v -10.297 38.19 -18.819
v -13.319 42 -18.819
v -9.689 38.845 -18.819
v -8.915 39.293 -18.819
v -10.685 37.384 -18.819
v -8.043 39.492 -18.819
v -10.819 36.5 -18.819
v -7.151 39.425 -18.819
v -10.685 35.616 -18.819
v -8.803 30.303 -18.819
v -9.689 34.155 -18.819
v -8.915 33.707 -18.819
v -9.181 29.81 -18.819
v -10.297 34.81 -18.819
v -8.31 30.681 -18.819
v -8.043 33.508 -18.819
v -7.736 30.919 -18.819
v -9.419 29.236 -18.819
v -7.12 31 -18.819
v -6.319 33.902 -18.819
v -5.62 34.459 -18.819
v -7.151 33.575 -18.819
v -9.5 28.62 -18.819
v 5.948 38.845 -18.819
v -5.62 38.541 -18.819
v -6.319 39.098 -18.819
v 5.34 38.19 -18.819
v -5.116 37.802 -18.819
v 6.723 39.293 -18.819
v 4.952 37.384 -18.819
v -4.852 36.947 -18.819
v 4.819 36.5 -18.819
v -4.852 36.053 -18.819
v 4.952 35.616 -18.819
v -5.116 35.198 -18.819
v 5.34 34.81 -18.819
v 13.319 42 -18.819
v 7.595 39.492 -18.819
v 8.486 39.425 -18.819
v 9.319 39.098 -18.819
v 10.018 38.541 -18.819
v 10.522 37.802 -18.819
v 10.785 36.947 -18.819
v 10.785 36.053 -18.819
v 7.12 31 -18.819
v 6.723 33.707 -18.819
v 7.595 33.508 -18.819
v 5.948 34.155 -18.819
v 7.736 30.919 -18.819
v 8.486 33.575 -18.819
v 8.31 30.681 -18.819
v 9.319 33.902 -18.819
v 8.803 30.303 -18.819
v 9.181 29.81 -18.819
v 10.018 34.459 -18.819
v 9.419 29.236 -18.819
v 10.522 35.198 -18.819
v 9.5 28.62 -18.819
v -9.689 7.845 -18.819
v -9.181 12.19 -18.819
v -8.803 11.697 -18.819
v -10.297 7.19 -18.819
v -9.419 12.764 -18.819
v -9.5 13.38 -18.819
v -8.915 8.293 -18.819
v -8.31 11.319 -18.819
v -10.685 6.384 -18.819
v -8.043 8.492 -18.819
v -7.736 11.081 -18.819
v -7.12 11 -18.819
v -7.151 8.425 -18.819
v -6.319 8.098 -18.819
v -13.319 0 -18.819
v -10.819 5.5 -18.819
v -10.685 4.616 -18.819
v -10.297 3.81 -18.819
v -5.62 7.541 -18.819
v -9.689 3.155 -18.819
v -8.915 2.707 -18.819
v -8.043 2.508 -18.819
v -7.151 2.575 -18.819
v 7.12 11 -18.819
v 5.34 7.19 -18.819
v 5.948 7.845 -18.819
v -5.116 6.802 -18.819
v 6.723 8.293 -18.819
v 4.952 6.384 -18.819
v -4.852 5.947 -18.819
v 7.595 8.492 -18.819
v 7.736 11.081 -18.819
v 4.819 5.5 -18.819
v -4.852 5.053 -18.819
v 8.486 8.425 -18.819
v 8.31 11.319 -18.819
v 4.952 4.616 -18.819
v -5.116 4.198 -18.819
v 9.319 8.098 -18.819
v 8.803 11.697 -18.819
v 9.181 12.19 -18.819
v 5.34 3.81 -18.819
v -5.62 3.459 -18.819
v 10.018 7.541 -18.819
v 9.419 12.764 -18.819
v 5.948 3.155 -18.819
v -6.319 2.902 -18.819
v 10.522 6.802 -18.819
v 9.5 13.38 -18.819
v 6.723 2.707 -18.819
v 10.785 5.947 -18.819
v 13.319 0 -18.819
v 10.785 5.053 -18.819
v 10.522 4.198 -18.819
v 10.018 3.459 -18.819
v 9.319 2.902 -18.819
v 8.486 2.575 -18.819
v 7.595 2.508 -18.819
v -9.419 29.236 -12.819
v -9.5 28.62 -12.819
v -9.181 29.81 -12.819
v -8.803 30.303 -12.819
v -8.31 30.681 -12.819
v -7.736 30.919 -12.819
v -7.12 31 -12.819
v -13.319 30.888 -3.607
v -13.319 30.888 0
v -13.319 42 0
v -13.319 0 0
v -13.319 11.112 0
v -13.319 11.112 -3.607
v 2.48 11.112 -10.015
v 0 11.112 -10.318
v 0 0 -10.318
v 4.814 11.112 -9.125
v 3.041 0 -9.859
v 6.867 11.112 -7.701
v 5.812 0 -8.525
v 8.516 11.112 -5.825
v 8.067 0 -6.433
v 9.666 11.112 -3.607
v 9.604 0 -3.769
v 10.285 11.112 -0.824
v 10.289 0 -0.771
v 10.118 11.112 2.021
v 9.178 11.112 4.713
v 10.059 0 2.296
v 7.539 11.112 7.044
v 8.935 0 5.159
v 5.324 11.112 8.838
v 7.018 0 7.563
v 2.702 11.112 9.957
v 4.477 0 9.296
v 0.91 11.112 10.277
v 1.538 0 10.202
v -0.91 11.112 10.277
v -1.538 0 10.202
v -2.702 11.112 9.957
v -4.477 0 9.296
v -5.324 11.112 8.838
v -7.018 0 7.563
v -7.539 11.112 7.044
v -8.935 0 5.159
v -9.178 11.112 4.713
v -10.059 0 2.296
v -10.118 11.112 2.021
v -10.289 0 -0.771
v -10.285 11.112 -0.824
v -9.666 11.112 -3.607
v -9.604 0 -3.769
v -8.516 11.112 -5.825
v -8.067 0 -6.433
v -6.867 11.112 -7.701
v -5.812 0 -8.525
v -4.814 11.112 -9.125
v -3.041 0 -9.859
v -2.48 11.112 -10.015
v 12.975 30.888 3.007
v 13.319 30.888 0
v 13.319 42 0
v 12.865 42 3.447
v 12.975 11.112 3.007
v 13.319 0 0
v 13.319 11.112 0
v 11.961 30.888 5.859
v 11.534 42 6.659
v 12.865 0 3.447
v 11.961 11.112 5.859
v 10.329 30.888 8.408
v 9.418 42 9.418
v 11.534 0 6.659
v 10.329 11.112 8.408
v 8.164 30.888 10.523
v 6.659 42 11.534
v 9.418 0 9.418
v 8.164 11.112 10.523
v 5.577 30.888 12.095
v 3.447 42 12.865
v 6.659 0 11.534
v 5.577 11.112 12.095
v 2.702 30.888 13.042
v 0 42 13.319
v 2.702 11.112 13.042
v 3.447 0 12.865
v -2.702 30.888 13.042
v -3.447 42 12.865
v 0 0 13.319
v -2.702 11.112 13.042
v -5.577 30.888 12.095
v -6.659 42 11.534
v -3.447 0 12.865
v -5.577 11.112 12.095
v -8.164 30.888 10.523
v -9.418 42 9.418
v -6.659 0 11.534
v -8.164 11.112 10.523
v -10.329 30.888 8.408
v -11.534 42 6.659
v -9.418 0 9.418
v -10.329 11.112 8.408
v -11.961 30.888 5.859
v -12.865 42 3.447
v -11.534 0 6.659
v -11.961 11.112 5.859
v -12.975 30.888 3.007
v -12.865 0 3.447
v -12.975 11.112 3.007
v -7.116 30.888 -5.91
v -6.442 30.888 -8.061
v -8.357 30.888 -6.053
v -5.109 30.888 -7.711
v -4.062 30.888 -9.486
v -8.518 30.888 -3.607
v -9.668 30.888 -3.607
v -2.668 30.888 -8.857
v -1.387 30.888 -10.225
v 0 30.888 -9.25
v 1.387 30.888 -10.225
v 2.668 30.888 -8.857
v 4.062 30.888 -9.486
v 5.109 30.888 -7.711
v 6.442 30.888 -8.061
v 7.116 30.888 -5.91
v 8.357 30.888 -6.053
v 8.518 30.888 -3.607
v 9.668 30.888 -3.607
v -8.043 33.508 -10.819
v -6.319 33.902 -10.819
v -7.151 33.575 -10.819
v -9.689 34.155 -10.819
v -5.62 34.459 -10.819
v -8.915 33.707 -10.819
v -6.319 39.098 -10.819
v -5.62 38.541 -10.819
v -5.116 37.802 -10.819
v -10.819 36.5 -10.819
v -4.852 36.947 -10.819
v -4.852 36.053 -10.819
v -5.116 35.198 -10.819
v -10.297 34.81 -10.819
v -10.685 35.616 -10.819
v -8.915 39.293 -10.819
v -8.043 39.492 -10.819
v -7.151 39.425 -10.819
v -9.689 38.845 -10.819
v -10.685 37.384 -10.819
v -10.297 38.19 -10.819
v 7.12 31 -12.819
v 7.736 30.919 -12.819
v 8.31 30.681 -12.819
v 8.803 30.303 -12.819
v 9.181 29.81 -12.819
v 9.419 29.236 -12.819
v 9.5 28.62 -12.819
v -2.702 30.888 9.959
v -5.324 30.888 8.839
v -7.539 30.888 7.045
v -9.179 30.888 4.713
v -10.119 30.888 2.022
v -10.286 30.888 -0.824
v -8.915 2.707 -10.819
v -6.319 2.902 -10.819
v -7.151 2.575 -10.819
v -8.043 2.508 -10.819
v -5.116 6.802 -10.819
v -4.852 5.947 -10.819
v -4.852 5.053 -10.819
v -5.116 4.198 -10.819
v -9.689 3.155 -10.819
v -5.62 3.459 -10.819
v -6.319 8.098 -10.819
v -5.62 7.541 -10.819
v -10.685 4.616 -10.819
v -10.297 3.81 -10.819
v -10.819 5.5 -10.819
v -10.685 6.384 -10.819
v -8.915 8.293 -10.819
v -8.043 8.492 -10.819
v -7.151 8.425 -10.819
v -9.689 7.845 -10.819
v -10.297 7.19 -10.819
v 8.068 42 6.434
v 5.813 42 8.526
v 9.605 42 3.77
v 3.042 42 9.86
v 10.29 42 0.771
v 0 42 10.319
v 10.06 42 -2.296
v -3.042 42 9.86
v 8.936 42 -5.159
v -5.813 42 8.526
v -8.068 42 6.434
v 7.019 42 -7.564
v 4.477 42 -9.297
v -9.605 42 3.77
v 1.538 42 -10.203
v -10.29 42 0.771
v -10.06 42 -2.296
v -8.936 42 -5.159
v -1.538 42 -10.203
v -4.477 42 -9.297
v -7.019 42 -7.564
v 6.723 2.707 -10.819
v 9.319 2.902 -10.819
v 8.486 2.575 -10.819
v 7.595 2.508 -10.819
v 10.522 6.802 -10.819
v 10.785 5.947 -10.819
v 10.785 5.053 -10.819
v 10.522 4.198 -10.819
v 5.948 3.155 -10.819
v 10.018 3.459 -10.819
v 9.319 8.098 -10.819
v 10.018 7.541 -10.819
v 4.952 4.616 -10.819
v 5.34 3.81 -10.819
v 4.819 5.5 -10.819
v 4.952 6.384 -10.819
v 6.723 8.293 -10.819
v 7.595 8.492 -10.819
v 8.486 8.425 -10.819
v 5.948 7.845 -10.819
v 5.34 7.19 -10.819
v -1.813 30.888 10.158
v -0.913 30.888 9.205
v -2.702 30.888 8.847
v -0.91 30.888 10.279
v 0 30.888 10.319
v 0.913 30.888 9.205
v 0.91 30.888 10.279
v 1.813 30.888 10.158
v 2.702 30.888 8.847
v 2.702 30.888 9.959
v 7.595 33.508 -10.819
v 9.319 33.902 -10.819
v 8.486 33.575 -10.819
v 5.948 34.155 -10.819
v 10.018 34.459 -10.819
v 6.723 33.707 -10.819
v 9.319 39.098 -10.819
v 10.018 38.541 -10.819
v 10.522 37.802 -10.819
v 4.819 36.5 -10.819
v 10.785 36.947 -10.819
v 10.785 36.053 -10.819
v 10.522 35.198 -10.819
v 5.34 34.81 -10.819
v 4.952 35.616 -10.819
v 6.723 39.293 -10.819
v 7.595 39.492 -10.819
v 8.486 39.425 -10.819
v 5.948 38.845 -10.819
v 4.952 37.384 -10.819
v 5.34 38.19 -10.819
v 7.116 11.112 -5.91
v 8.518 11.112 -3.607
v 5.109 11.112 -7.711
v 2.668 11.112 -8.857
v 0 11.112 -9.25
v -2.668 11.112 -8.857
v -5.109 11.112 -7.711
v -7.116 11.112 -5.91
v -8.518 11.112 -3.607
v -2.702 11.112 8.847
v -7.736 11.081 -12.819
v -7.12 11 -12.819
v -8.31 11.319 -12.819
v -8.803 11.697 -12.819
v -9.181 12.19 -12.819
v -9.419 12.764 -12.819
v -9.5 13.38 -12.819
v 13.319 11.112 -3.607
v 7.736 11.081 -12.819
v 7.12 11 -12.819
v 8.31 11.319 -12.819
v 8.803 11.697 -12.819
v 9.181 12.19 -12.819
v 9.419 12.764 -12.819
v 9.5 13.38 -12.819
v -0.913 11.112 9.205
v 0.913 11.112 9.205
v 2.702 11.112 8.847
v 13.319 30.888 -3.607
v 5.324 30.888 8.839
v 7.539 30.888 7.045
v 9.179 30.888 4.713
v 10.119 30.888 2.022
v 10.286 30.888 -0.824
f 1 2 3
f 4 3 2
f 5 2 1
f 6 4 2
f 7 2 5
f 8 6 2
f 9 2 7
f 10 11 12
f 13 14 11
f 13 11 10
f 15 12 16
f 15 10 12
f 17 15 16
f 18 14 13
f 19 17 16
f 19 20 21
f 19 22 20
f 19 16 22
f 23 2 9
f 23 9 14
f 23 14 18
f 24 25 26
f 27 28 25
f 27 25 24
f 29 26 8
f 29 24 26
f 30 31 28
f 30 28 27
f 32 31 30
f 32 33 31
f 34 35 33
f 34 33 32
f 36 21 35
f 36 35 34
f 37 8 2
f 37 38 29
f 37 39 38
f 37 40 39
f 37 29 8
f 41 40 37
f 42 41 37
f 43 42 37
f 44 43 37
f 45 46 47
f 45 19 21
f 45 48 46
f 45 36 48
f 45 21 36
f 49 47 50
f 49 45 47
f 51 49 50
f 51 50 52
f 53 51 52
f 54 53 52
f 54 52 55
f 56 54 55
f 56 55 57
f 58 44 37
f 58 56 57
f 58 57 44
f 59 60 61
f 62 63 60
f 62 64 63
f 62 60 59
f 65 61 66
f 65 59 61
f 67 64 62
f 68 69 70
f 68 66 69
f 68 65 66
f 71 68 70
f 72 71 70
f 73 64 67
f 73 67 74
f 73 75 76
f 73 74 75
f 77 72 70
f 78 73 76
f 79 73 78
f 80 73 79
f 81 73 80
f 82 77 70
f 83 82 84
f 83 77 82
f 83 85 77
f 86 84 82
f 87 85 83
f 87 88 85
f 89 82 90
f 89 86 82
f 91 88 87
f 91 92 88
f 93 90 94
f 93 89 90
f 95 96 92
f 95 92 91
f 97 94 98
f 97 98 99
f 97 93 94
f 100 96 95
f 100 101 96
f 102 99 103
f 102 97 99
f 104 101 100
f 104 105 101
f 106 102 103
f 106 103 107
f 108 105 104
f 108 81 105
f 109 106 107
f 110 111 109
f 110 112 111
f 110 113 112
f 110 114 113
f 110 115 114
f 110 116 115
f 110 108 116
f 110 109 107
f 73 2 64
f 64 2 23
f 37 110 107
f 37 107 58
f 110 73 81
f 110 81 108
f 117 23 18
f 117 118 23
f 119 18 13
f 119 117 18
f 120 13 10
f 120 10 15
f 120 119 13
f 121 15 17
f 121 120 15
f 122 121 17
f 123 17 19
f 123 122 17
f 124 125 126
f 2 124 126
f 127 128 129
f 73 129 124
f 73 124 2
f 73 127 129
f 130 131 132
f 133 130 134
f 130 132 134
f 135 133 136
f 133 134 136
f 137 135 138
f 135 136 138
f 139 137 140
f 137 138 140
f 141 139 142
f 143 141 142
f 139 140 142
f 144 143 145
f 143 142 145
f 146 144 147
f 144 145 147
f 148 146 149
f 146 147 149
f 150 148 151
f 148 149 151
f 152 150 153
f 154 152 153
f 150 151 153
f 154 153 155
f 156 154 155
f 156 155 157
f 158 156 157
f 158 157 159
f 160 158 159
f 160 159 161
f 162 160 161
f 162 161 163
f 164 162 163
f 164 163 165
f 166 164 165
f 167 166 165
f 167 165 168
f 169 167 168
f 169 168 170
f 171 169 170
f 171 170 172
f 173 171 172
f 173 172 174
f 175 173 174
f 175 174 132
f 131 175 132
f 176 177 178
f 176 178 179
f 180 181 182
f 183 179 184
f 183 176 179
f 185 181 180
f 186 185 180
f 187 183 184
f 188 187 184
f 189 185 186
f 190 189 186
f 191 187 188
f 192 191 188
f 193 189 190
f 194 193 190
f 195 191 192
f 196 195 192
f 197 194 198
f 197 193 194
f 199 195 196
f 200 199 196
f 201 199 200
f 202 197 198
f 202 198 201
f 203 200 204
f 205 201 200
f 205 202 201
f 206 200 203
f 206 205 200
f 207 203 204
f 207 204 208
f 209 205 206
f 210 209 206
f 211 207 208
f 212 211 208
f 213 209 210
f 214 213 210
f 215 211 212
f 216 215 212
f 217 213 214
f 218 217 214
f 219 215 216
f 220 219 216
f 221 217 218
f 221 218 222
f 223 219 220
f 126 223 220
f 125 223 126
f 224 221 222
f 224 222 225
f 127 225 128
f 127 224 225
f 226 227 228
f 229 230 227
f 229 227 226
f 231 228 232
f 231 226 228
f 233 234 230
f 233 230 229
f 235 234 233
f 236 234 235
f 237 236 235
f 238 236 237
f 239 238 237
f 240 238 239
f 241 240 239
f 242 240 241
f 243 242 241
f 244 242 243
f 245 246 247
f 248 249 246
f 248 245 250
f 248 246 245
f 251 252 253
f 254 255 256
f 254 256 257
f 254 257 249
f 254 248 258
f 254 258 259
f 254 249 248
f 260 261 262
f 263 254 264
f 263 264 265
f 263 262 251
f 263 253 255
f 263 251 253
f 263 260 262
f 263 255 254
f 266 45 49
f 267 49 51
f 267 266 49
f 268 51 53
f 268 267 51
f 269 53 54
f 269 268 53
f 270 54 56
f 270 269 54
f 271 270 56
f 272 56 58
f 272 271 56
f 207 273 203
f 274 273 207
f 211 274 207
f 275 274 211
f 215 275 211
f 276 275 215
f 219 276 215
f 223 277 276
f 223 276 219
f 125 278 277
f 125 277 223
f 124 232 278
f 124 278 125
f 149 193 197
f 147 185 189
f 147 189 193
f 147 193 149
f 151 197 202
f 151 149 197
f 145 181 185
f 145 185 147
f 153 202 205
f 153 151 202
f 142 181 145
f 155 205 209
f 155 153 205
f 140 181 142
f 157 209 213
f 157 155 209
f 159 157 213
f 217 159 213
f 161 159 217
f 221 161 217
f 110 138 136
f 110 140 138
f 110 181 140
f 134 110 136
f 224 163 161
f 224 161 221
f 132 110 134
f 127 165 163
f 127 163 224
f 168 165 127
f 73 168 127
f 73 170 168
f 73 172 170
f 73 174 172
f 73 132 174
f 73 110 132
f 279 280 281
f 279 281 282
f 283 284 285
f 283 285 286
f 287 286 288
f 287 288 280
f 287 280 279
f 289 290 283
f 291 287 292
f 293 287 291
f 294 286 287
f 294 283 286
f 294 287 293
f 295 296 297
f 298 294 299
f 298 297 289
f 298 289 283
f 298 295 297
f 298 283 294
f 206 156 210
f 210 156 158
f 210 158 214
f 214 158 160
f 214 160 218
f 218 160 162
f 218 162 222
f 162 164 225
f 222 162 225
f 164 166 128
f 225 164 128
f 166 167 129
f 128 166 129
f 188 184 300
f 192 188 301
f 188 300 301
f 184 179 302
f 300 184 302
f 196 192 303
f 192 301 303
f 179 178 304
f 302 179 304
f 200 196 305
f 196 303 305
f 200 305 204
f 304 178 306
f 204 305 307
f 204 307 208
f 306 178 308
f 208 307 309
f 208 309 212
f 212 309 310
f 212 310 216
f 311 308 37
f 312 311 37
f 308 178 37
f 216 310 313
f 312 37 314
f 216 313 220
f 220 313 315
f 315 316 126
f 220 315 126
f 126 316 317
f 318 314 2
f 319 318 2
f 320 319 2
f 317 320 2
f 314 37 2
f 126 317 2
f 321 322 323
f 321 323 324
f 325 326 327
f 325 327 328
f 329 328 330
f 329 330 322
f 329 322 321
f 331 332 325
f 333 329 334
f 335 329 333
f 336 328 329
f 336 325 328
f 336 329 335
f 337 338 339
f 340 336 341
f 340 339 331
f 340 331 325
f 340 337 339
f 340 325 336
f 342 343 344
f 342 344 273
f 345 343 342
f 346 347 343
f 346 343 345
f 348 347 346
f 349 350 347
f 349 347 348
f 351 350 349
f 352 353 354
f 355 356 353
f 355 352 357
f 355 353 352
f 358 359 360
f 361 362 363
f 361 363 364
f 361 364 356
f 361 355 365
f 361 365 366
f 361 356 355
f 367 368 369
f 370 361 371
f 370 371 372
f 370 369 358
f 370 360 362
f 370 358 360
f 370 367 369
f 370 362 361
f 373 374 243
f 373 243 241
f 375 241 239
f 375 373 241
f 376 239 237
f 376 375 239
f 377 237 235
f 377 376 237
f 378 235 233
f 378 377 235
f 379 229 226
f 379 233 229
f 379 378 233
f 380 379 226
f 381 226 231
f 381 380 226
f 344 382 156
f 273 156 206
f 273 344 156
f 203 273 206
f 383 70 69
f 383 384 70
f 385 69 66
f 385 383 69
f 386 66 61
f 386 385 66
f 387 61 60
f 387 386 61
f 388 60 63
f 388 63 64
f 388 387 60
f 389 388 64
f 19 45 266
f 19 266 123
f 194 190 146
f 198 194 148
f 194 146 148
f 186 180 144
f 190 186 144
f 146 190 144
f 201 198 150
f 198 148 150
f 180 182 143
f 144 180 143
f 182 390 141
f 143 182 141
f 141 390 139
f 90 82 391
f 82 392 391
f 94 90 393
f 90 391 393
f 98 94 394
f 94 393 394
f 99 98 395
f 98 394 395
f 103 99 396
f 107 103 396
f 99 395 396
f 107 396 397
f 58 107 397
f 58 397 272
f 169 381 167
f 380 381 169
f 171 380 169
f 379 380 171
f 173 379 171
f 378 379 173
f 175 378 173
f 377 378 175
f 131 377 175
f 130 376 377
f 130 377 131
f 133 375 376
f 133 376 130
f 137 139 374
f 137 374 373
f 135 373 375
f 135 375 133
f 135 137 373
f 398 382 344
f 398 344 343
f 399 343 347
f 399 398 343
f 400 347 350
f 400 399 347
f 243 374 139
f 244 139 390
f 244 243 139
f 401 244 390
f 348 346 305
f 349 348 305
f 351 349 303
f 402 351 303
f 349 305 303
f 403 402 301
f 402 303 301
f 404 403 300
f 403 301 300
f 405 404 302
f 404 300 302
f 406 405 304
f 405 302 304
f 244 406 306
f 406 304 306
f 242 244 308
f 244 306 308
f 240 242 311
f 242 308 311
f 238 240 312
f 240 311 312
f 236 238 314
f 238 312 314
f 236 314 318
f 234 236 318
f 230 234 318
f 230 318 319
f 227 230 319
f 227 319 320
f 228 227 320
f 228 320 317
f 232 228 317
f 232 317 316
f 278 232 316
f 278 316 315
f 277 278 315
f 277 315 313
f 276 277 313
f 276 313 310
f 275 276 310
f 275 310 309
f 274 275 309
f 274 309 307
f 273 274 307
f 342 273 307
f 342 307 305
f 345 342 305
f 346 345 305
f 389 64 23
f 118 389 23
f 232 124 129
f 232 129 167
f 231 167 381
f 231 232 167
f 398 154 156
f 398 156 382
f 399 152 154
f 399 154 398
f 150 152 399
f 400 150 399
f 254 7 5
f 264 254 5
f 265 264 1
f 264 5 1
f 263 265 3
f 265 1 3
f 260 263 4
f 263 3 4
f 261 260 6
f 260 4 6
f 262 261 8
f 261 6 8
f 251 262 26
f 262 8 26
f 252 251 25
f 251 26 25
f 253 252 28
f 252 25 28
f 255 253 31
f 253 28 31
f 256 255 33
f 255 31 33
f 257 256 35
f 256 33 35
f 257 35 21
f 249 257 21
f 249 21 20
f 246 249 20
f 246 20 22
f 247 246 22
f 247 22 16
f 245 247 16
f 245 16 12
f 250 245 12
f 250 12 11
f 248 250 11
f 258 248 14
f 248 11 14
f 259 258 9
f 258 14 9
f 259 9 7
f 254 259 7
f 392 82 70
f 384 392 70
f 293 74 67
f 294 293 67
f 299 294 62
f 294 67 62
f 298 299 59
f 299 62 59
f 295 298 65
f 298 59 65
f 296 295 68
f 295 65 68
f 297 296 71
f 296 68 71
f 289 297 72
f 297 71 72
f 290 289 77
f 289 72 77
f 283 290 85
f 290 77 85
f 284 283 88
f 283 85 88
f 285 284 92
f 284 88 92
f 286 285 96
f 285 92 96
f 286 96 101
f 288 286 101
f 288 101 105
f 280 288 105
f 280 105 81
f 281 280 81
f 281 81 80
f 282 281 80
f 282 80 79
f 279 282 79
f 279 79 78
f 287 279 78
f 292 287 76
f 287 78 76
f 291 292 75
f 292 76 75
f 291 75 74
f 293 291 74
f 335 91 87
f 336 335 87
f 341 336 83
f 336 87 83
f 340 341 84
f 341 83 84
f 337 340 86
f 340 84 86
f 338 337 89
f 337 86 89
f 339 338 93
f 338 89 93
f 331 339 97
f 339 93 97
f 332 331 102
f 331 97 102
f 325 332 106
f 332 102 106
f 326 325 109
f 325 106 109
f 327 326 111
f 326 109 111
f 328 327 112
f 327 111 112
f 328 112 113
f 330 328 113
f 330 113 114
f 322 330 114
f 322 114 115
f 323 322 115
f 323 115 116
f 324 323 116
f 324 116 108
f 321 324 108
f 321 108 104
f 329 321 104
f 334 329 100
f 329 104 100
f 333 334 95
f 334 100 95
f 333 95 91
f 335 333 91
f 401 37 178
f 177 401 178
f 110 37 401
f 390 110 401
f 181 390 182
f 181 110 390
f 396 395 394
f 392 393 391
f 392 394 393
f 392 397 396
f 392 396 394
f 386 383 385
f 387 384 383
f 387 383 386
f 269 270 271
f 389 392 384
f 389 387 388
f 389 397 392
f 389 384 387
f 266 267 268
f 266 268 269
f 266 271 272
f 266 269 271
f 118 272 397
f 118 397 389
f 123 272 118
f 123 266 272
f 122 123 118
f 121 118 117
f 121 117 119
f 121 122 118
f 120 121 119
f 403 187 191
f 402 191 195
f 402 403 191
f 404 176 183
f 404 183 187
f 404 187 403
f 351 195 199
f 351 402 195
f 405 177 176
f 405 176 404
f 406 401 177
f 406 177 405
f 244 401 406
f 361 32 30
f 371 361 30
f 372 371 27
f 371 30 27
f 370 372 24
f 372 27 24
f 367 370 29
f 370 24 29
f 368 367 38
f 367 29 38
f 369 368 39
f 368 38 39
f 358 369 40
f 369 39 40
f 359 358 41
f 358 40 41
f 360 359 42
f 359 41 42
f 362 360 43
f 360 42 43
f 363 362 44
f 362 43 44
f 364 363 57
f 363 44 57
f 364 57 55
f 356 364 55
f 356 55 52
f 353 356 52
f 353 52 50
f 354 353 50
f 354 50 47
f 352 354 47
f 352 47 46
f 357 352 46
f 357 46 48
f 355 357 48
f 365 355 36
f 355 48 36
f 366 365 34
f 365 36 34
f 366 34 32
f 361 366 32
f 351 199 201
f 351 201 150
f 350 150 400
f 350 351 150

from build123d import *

# Parameters (mm, degrees)
SKETCH1_R           = 9.25
BOSS_EXTRUDE1_DEPTH = 42
SKETCH2_R           = 10.31875
CUT_EXTRUDE1_DEPTH  = 11.1125
SKETCH3_R           = 10.3175
CUT_EXTRUDE2_DEPTH  = 11.1125
CUT_EXTRUDE3_DEPTH  = 19.775
SKETCH5_R           = 3
CUT_EXTRUDE4_DEPTH  = 8
SKETCH6_W           = 19
SKETCH6_H           = 20
CUT_EXTRUDE5_DEPTH  = 6
FILLET1_R           = 2.38


with BuildPart() as part:
    # Sketch1 → Boss-Extrude1 (new body)
    with BuildSketch(Plane(origin=(0, 0, 0), x_dir=(1, 0, 0), z_dir=(0, 1, 0))):
        with BuildLine():
            Line((-13.31875, 0), (-13.31875, 13.31875))
            Line((-13.31875, 13.31875), (-13.31875, 17.81875))
            Line((-13.31875, 17.81875), (-13.31875, 18.81875))
            Line((-13.31875, 18.81875), (13.31875, 18.81875))
            Line((13.31875, 18.81875), (13.31875, 17.81875))
            Line((13.31875, 17.81875), (13.31875, 13.31875))
            Line((13.31875, 13.31875), (13.31875, 0))
            ThreePointArc((13.31875, 0), (0, -13.31875), (-13.31875, 0))
        make_face()
        with Locations(Location((0, 0, 0), (0, 0, 90))):
            Circle(SKETCH1_R, mode=Mode.SUBTRACT)
    extrude(amount=BOSS_EXTRUDE1_DEPTH)

    # Sketch2 → Cut-Extrude1 (cut)
    with BuildSketch(Plane(origin=(0, 42, 0), x_dir=(1, 0, 0), z_dir=(0, 1, 0))):
        with Locations(Location((0, 0, 0), (0, 0, 270))):
            Circle(SKETCH2_R)
    extrude(amount=-CUT_EXTRUDE1_DEPTH, mode=Mode.SUBTRACT)

    # Sketch3 → Cut-Extrude2 (cut)
    with BuildSketch(Plane.XZ):
        with Locations(Location((0, 0, 0), (0, 0, 270))):
            Circle(SKETCH3_R)
    extrude(amount=-CUT_EXTRUDE2_DEPTH, mode=Mode.SUBTRACT)

    # Sketch4 → Cut-Extrude3 (cut)
    with BuildSketch(Plane(origin=(0, 30.8875, 0), x_dir=(1, 0, 0), z_dir=(0, 1, 0))):
        Polygon((2.702073717, -6.203740676), (-2.702073717, -6.203740676), (-2.702073717, -16.08189807), (-18.957765954, -16.08189807), (-18.957765954, 3.606897718), (22.504521647, 3.606897718), (22.504521647, -16.08189807), (2.702073717, -16.08189807), align=None)
    extrude(amount=-CUT_EXTRUDE3_DEPTH, mode=Mode.SUBTRACT)

    # Sketch5 → Cut-Extrude4 (cut)
    with BuildSketch(Plane(origin=(0, 0, -18.81875), x_dir=(-1, 0, 0), z_dir=(0, 0, -1))):
        with Locations((-7.81875, 5.5)):
            Circle(SKETCH5_R)
        with Locations((7.81875, 5.5)):
            Circle(SKETCH5_R)
        with Locations((7.81875, 36.5)):
            Circle(SKETCH5_R)
        with Locations((-7.81875, 36.5)):
            Circle(SKETCH5_R)
    extrude(amount=-CUT_EXTRUDE4_DEPTH, mode=Mode.SUBTRACT)

    # Sketch6 → Cut-Extrude5 (cut)
    with BuildSketch(Plane(origin=(0, 0, -18.81875), x_dir=(-1, 0, 0), z_dir=(0, 0, -1))):
        with Locations((0, 21)):
            Rectangle(SKETCH6_W, SKETCH6_H)
    extrude(amount=-CUT_EXTRUDE5_DEPTH, mode=Mode.SUBTRACT)

    # Fillet1
    fillet1_edges = [part.edges().sort_by_distance(p)[0] for p in [
        (-9.5, 31, -15.81875),
        (-9.5, 11, -15.81875),
        (9.5, 11, -15.81875),
        (9.5, 31, -15.81875),
    ]]
    fillet(fillet1_edges, radius=FILLET1_R)


solid = part.part
